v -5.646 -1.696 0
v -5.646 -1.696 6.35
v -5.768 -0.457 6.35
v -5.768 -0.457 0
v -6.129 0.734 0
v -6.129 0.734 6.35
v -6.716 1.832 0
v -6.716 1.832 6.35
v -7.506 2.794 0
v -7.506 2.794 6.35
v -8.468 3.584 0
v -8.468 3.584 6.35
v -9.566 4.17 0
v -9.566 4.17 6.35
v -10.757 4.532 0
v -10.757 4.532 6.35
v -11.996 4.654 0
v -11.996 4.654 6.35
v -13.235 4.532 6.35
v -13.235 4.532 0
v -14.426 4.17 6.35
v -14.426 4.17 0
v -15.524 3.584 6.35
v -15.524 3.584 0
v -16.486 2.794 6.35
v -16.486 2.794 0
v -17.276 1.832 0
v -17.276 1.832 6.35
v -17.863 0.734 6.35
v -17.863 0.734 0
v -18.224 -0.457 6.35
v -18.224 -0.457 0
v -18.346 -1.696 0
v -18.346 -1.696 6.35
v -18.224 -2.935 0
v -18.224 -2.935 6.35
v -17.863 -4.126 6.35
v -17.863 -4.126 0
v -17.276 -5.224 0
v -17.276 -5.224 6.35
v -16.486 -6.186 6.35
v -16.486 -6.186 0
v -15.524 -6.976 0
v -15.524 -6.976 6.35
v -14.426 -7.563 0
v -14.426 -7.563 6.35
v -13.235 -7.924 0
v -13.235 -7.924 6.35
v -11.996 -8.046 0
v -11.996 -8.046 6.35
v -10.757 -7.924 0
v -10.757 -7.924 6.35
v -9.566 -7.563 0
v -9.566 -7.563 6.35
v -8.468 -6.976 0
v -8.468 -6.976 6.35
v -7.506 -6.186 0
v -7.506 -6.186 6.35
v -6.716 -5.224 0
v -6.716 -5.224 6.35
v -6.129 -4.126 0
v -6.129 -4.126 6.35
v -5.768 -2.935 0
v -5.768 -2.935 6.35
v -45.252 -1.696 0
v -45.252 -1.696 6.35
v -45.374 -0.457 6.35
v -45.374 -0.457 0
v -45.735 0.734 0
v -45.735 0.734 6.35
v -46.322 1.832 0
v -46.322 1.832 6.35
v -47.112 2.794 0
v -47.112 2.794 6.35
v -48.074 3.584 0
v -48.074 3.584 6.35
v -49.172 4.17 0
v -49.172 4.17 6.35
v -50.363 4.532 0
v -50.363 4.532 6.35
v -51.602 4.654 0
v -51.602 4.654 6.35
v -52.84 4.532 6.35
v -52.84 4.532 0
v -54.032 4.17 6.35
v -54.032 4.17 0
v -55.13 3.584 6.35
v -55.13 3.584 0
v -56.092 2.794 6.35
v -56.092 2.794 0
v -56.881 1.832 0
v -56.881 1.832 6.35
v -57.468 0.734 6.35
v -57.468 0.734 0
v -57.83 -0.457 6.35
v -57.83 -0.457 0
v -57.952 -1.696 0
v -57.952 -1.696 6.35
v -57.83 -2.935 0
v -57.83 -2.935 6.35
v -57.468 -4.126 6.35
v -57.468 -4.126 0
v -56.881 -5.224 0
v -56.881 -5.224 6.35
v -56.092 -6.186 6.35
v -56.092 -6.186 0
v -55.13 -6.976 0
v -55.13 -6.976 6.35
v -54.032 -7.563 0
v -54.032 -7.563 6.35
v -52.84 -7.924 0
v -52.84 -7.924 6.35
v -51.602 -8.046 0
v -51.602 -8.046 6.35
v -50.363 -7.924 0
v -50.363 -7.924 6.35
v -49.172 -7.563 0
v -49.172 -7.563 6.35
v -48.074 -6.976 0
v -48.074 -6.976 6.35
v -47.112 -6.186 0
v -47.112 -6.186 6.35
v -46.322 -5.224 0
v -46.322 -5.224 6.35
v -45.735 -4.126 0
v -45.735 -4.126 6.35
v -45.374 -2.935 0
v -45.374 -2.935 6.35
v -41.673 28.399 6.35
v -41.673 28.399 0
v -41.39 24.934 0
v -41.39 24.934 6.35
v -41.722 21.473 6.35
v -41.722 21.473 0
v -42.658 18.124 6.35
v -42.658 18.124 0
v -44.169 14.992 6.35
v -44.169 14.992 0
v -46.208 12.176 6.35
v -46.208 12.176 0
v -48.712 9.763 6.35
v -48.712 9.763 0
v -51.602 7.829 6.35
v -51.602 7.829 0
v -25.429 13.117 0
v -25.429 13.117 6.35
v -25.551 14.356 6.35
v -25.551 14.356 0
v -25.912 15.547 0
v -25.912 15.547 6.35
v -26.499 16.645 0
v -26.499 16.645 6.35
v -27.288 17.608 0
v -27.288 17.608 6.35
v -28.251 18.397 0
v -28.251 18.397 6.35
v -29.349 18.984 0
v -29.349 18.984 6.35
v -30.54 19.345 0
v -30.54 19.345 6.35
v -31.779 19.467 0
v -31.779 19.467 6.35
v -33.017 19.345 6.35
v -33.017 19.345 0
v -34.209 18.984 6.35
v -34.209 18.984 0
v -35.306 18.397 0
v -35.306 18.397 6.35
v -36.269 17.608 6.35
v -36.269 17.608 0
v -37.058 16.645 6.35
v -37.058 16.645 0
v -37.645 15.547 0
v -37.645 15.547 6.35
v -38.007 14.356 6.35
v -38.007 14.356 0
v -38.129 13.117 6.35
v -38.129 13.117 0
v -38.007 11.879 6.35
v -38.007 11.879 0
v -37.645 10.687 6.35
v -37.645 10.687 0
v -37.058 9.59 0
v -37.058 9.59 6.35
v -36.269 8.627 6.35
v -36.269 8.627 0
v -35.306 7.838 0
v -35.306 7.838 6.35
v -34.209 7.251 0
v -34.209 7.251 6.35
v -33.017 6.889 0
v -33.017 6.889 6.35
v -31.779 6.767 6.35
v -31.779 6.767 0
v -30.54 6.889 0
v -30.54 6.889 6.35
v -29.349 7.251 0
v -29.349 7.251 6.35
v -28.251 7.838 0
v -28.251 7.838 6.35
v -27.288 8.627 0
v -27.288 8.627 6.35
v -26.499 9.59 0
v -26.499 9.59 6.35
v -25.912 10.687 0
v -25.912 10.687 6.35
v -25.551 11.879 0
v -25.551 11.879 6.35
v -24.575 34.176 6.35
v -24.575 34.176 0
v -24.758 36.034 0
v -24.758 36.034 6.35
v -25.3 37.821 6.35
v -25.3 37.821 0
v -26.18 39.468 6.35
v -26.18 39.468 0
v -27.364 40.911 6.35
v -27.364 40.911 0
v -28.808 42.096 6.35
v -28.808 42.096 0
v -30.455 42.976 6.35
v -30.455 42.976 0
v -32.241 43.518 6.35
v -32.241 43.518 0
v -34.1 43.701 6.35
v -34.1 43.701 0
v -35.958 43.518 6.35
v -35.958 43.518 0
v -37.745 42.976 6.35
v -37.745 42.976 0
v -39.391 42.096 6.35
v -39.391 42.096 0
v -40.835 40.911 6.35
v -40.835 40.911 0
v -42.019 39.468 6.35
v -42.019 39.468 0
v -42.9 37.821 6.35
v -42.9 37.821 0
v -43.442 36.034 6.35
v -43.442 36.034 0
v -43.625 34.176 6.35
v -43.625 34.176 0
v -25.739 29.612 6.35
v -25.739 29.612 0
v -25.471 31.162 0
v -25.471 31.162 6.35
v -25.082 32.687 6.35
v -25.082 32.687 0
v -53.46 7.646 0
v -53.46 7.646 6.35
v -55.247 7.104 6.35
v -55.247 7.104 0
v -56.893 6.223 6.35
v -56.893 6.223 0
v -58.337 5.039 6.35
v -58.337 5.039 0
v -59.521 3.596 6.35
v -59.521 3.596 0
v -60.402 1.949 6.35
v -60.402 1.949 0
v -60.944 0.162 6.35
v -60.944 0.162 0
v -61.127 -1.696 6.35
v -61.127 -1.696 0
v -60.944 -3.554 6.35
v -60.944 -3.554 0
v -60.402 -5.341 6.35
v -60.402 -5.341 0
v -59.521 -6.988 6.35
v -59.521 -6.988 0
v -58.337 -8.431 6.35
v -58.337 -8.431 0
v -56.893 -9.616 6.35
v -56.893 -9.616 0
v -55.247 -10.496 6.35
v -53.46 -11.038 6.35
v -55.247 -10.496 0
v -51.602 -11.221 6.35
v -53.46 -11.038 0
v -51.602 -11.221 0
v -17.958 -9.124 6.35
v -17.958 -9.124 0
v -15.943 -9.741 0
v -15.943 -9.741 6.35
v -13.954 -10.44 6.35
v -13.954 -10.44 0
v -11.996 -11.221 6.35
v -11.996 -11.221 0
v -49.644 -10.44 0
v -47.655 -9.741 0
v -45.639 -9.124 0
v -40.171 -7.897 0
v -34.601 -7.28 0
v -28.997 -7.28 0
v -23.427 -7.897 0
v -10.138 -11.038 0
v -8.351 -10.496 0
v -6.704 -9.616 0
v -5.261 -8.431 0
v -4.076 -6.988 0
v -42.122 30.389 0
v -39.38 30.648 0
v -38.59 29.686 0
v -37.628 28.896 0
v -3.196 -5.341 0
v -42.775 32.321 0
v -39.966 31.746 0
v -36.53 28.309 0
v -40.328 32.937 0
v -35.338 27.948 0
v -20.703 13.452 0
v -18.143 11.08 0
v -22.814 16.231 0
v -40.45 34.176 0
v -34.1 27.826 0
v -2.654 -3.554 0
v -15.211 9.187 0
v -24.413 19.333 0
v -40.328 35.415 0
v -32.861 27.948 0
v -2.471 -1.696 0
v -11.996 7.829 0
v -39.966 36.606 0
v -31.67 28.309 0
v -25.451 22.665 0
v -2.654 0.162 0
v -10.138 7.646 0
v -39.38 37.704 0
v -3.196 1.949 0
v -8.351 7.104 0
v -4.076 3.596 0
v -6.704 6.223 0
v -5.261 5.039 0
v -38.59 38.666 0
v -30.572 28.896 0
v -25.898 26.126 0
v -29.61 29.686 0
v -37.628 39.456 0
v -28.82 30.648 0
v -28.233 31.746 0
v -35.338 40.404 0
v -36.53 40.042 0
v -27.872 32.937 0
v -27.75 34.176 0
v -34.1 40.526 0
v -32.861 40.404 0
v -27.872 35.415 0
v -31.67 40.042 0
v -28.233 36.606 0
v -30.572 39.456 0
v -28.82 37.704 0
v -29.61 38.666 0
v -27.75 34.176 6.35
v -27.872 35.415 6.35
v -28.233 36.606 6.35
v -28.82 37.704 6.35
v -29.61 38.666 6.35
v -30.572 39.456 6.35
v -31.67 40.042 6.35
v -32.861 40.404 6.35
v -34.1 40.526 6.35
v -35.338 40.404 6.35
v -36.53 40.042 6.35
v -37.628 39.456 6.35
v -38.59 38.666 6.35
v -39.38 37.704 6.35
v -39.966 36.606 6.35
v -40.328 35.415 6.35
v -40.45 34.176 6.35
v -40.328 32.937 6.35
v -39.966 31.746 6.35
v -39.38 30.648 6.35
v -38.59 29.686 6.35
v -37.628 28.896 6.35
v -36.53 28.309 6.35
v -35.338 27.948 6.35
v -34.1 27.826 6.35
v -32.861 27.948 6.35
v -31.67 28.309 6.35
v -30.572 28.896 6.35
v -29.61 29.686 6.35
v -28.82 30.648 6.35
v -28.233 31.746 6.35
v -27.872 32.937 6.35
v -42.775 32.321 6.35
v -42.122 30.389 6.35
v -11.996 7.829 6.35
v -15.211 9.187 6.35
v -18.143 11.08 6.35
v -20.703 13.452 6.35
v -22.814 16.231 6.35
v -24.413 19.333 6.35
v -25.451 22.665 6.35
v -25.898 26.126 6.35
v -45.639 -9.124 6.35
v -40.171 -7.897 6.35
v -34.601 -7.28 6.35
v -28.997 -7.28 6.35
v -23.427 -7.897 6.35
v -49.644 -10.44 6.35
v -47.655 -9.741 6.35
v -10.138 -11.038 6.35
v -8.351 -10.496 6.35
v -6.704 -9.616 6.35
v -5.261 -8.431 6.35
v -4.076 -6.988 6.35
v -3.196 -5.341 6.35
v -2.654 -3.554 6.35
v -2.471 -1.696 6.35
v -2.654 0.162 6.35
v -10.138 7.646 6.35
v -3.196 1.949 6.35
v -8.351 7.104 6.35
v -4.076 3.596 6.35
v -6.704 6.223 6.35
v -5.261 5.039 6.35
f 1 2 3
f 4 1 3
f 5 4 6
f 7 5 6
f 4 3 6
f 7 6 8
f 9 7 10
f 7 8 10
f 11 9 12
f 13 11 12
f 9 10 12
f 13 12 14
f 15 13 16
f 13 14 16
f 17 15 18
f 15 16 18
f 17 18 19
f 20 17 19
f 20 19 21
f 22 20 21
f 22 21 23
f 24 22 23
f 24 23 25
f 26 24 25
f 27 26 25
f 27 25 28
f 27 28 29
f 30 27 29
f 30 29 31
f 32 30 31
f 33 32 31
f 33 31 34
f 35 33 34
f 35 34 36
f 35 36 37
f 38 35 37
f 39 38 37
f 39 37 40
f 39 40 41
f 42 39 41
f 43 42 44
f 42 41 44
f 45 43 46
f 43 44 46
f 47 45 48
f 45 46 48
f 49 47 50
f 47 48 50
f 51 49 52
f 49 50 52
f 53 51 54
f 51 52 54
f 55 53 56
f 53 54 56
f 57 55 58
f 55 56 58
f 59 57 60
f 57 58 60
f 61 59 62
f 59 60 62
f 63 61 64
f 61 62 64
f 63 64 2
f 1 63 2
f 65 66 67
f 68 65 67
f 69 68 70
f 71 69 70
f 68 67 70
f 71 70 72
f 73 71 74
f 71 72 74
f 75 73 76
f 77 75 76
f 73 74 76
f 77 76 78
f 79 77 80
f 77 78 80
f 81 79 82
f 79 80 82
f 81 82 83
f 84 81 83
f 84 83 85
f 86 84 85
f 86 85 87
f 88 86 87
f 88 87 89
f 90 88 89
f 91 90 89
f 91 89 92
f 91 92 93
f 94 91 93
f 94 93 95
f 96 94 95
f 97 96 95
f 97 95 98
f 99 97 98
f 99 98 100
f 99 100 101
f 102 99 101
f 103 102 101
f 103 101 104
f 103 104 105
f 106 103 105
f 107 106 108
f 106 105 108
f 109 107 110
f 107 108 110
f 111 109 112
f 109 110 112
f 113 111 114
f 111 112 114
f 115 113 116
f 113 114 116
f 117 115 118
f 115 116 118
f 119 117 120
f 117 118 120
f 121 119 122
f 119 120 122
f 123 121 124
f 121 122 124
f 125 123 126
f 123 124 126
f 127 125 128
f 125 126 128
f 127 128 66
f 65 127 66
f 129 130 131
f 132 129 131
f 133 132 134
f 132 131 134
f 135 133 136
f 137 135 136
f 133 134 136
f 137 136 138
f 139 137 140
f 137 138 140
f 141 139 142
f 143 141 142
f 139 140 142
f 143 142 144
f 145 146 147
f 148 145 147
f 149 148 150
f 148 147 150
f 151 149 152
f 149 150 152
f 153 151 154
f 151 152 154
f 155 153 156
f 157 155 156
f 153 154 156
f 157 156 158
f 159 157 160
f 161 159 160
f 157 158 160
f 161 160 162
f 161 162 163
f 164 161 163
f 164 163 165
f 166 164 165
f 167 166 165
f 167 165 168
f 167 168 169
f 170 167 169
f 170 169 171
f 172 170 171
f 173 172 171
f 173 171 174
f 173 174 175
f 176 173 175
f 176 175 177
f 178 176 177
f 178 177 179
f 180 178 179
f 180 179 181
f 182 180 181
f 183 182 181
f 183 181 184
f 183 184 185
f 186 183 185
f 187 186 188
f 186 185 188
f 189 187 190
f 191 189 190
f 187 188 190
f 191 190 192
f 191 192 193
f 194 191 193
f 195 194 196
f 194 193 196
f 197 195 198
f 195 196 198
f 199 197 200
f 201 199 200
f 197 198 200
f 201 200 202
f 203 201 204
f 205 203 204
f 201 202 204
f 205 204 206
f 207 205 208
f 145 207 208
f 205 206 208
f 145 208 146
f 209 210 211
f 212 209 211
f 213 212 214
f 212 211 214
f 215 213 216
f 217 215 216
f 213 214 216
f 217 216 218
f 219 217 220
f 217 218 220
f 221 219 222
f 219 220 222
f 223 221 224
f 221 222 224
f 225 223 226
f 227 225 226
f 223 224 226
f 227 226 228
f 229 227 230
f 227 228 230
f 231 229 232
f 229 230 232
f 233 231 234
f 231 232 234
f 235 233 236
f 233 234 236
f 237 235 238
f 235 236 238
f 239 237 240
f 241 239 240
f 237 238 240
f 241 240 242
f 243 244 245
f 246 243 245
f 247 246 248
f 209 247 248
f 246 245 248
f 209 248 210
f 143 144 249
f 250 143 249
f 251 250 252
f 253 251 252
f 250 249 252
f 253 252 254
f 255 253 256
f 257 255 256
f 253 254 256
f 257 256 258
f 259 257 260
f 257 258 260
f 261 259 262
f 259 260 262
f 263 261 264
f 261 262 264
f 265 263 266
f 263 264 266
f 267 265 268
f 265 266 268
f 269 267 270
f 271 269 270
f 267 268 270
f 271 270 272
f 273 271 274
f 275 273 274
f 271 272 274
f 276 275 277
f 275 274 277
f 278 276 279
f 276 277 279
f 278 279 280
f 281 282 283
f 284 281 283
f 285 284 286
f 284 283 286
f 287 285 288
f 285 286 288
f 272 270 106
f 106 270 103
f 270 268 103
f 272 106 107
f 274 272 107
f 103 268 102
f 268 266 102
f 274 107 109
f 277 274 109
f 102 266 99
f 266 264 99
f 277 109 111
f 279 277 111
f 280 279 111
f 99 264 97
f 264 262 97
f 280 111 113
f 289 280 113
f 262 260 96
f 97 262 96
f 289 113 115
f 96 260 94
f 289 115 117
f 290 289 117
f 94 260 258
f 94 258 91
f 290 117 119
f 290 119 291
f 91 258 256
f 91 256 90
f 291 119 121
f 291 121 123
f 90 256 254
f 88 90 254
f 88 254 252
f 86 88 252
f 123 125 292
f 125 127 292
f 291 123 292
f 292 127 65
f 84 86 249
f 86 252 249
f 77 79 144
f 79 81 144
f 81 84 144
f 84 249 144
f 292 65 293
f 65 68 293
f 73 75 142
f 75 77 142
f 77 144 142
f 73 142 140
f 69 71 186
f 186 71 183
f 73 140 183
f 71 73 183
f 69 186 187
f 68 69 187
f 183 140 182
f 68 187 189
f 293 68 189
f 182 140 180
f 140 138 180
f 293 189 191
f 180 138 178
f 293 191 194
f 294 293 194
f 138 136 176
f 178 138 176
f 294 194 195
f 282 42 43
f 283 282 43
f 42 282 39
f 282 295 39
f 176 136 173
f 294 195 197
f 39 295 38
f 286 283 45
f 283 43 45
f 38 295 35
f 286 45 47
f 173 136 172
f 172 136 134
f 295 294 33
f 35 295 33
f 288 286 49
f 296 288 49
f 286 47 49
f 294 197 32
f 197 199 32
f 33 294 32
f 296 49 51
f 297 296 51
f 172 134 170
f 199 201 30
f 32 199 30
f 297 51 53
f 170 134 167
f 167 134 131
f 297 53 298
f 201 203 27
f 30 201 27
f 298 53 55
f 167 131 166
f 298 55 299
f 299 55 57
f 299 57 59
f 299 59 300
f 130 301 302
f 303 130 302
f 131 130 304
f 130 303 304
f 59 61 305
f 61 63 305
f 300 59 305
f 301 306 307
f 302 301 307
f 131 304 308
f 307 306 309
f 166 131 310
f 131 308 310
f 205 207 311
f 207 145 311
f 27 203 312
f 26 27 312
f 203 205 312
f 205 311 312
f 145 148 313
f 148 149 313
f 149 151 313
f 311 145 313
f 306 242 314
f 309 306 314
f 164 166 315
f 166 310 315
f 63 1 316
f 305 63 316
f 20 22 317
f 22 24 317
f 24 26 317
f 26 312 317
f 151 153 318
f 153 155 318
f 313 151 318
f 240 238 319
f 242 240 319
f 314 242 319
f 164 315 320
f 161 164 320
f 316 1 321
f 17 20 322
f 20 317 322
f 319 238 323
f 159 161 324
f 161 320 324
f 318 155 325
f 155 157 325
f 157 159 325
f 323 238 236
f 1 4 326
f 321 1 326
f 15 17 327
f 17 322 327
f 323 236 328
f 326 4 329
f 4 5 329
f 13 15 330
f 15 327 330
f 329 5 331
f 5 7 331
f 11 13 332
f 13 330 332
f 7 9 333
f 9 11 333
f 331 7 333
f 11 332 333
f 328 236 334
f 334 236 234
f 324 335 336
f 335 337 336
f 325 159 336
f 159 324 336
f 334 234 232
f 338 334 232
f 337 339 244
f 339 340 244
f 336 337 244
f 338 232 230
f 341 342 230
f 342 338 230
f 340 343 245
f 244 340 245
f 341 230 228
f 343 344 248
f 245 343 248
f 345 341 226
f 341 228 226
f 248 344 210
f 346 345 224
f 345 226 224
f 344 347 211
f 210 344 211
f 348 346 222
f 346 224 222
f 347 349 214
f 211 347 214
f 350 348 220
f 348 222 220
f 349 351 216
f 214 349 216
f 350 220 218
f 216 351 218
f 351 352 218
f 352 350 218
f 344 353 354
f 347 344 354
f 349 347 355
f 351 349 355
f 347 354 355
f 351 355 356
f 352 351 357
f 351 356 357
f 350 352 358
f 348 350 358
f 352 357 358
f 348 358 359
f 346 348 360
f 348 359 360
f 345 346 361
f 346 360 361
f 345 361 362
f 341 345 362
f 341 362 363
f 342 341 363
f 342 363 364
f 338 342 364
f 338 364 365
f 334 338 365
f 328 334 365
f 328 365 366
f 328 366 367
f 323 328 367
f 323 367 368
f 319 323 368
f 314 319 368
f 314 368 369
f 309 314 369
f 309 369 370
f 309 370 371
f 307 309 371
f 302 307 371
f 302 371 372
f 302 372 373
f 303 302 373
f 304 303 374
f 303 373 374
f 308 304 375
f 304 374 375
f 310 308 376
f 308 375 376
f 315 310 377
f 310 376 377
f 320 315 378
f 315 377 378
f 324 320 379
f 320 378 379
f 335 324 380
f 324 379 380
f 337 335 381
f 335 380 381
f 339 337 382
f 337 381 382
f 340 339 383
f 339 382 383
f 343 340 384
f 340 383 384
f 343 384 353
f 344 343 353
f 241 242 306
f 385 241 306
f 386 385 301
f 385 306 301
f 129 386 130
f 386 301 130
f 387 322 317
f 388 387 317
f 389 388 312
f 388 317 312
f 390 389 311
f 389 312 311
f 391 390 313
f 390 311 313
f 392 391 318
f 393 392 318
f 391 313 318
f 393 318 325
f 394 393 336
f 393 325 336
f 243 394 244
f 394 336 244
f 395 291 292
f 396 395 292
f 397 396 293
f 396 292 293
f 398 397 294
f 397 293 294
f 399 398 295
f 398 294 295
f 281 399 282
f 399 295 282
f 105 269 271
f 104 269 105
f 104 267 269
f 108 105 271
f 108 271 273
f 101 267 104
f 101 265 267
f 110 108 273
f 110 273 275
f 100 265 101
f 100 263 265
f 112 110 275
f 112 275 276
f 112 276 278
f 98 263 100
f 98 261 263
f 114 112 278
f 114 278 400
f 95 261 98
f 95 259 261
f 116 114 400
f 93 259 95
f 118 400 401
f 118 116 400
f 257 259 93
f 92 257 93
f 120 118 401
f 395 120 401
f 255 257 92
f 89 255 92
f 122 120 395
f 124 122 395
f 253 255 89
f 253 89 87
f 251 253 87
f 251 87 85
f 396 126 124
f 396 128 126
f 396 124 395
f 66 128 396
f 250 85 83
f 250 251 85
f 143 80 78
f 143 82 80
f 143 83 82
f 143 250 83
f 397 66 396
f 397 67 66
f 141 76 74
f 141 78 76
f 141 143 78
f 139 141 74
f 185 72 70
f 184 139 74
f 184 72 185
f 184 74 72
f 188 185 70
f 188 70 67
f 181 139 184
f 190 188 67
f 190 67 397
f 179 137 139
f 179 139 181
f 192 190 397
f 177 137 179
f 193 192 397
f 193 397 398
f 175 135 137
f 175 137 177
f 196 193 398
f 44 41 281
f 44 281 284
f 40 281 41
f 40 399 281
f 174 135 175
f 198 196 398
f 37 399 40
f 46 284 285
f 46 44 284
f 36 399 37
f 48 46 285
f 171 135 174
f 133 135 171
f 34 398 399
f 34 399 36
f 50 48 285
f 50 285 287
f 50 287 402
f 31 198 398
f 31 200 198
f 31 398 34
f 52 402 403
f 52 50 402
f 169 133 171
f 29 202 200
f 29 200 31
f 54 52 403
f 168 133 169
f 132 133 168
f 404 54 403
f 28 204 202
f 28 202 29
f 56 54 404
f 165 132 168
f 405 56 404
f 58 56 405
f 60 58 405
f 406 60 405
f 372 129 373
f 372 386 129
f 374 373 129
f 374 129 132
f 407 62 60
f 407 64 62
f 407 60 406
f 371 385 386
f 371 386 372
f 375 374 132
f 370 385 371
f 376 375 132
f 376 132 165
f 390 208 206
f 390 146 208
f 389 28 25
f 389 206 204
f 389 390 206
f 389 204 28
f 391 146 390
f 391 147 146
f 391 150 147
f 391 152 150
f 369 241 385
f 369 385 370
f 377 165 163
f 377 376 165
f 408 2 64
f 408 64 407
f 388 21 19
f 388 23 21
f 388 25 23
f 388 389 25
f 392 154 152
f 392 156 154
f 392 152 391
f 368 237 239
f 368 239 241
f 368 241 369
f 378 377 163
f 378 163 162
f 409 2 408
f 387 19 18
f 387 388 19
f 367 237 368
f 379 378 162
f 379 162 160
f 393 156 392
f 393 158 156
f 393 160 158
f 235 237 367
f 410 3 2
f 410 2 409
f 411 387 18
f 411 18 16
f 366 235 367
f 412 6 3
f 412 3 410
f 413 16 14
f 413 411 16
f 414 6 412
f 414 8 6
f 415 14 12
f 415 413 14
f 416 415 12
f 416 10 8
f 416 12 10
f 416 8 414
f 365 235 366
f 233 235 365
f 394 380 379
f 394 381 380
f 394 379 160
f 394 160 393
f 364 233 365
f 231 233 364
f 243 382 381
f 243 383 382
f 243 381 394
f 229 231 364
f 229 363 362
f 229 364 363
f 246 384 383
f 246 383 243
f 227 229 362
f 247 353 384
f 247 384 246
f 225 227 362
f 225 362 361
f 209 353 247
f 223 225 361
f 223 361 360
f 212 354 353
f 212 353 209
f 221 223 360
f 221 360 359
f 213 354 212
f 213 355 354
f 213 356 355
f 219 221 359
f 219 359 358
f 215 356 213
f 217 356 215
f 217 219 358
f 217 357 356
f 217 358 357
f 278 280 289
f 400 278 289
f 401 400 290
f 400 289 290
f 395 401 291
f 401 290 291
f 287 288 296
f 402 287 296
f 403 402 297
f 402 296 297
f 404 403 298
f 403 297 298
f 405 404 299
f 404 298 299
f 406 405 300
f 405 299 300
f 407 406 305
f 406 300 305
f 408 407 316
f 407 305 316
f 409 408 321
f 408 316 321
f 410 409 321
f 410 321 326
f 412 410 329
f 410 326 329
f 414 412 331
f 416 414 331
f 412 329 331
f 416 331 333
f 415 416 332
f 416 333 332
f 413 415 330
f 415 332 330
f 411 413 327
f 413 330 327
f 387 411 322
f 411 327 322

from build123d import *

# Parameters (mm, degrees)
F1_DEPTH = 25.4
F2_R     = 6.35
F3_DEPTH = 25.401
F4_DEPTH = 19.05
F5_R     = 6.35
F6_DEPTH = 6.351


with BuildPart() as f1:
    # F0 (on Top) → F1 (new body)
    with BuildSketch(Plane.XY):
        with BuildLine():
            ThreePointArc((-11.9960894898, 7.8287454173), (-22.8140252531, 16.2307401146), (-25.7390544228, 29.6122741608))
            ThreePointArc((-25.7390544228, 29.6122741608), (-33.3767507176, 24.6782589704), (-41.673253936, 28.3994073062))
            ThreePointArc((-41.673253936, 28.3994073062), (-43.3440087931, 16.5245060033), (-51.6016386333, 7.8287454173))
            ThreePointArc((-51.6016386333, 7.8287454173), (-44.8664465425, 5.0389375081), (-42.0766386333, -1.6962545827))
            ThreePointArc((-42.0766386333, -1.6962545827), (-43.013362785, -5.8153737791), (-45.6392933218, -9.1243137765))
            ThreePointArc((-45.6392933218, -9.1243137765), (-31.7988640615, -7.20255554), (-17.9584348012, -9.1243137765))
            ThreePointArc((-17.9584348012, -9.1243137765), (-20.9815746971, 1.463916392), (-11.9960894898, 7.8287454173))
        make_face()
        with BuildLine():
            ThreePointArc((-42.0766386333, -1.6962545827), (-44.8664465425, 5.0389375081), (-51.6016386333, 7.8287454173))
            ThreePointArc((-51.6016386333, 7.8287454173), (-61.1266386333, -1.6962545827), (-51.6016386333, -11.2212545827))
            ThreePointArc((-51.6016386333, -11.2212545827), (-48.6531092599, -10.0799677677), (-45.6392933218, -9.1243137765))
            ThreePointArc((-45.6392933218, -9.1243137765), (-43.013362785, -5.8153737791), (-42.0766386333, -1.6962545827))
        make_face()
        with BuildLine():
            ThreePointArc((-2.4710894898, -1.6962545827), (-5.260897399, 5.0389375081), (-11.9960894898, 7.8287454173))
            ThreePointArc((-11.9960894898, 7.8287454173), (-20.9815746971, 1.463916392), (-17.9584348012, -9.1243137765))
            ThreePointArc((-17.9584348012, -9.1243137765), (-14.9446188632, -10.0799677677), (-11.9960894898, -11.2212545827))
            ThreePointArc((-11.9960894898, -11.2212545827), (-5.260897399, -8.4314466735), (-2.4710894898, -1.6962545827))
        make_face()
        with BuildLine():
            ThreePointArc((-25.7390544228, 29.6122741608), (-25.2909601874, 31.9282439717), (-24.5746759409, 34.175785181))
            ThreePointArc((-24.5746759409, 34.175785181), (-34.0996759409, 43.700785181), (-43.6246759409, 34.175785181))
            ThreePointArc((-43.6246759409, 34.175785181), (-42.4236958583, 31.3636984394), (-41.673253936, 28.3994073062))
            ThreePointArc((-41.673253936, 28.3994073062), (-33.3767507176, 24.6782589704), (-25.7390544228, 29.6122741608))
        make_face()
    extrude(amount=F1_DEPTH)

    # F2 (on face) → F3 (cut, through all)
    with BuildSketch(Plane.XY.offset(25.4)):
        with Locations((-51.6016386333, -1.6962545827)):
            Circle(F2_R)
        with Locations((-11.9960894898, -1.6962545827)):
            Circle(F2_R)
        with Locations((-34.0996759409, 34.175785181)):
            Circle(F2_R)
    extrude(amount=-F3_DEPTH, mode=Mode.SUBTRACT)

    # F4 (cut): a face of the model
    f4_faces = [f1.faces().sort_by_distance(p)[0] for p in [
        (-32.4383450301, 9.0422986836, 25.4),
    ]]
    extrude(f4_faces, amount=-F4_DEPTH, mode=Mode.SUBTRACT)

    # F5 (on face) → F6 (cut, through all)
    with BuildSketch(Plane.XY.offset(6.35)):
        with Locations((-31.778564126, 13.1174343201)):
            Circle(F5_R)
    extrude(amount=-F6_DEPTH, mode=Mode.SUBTRACT)


solid = f1.part
